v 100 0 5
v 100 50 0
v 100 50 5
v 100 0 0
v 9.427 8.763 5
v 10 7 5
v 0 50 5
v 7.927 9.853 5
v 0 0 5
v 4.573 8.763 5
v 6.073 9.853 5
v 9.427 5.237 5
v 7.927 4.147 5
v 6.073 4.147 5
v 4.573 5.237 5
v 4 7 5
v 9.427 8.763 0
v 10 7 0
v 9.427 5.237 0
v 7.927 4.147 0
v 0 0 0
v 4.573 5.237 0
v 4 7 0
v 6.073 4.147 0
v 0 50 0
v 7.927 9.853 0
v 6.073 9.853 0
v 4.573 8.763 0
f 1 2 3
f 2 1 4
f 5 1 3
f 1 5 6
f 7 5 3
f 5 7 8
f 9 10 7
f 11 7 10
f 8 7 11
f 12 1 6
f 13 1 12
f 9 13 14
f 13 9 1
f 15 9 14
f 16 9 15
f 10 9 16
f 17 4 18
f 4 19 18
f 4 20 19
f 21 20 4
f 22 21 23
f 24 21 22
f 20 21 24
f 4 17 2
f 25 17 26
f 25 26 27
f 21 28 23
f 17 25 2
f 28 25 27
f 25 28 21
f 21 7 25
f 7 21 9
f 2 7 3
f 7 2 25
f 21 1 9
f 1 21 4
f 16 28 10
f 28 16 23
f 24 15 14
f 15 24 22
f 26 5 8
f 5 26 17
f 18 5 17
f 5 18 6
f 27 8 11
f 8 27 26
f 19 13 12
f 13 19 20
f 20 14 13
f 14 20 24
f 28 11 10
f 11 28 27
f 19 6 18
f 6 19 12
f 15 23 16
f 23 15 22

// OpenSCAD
// dimensions in millimeter [width, depth, height]
plate = [100, 50, 5];

hole_dm = 6;
hole_margin = 4;

difference() {
    cube(plate);

    translate([
        hole_margin + hole_dm / 2,
        hole_margin + hole_dm / 2,
        -1
    ])
    color( "red" )
     cylinder( h = plate.z + 2, d = hole_dm);
}

//echo(plate.x, plate.y, plate.z);
//echo(plate[0], plate[1], plate[2]);
